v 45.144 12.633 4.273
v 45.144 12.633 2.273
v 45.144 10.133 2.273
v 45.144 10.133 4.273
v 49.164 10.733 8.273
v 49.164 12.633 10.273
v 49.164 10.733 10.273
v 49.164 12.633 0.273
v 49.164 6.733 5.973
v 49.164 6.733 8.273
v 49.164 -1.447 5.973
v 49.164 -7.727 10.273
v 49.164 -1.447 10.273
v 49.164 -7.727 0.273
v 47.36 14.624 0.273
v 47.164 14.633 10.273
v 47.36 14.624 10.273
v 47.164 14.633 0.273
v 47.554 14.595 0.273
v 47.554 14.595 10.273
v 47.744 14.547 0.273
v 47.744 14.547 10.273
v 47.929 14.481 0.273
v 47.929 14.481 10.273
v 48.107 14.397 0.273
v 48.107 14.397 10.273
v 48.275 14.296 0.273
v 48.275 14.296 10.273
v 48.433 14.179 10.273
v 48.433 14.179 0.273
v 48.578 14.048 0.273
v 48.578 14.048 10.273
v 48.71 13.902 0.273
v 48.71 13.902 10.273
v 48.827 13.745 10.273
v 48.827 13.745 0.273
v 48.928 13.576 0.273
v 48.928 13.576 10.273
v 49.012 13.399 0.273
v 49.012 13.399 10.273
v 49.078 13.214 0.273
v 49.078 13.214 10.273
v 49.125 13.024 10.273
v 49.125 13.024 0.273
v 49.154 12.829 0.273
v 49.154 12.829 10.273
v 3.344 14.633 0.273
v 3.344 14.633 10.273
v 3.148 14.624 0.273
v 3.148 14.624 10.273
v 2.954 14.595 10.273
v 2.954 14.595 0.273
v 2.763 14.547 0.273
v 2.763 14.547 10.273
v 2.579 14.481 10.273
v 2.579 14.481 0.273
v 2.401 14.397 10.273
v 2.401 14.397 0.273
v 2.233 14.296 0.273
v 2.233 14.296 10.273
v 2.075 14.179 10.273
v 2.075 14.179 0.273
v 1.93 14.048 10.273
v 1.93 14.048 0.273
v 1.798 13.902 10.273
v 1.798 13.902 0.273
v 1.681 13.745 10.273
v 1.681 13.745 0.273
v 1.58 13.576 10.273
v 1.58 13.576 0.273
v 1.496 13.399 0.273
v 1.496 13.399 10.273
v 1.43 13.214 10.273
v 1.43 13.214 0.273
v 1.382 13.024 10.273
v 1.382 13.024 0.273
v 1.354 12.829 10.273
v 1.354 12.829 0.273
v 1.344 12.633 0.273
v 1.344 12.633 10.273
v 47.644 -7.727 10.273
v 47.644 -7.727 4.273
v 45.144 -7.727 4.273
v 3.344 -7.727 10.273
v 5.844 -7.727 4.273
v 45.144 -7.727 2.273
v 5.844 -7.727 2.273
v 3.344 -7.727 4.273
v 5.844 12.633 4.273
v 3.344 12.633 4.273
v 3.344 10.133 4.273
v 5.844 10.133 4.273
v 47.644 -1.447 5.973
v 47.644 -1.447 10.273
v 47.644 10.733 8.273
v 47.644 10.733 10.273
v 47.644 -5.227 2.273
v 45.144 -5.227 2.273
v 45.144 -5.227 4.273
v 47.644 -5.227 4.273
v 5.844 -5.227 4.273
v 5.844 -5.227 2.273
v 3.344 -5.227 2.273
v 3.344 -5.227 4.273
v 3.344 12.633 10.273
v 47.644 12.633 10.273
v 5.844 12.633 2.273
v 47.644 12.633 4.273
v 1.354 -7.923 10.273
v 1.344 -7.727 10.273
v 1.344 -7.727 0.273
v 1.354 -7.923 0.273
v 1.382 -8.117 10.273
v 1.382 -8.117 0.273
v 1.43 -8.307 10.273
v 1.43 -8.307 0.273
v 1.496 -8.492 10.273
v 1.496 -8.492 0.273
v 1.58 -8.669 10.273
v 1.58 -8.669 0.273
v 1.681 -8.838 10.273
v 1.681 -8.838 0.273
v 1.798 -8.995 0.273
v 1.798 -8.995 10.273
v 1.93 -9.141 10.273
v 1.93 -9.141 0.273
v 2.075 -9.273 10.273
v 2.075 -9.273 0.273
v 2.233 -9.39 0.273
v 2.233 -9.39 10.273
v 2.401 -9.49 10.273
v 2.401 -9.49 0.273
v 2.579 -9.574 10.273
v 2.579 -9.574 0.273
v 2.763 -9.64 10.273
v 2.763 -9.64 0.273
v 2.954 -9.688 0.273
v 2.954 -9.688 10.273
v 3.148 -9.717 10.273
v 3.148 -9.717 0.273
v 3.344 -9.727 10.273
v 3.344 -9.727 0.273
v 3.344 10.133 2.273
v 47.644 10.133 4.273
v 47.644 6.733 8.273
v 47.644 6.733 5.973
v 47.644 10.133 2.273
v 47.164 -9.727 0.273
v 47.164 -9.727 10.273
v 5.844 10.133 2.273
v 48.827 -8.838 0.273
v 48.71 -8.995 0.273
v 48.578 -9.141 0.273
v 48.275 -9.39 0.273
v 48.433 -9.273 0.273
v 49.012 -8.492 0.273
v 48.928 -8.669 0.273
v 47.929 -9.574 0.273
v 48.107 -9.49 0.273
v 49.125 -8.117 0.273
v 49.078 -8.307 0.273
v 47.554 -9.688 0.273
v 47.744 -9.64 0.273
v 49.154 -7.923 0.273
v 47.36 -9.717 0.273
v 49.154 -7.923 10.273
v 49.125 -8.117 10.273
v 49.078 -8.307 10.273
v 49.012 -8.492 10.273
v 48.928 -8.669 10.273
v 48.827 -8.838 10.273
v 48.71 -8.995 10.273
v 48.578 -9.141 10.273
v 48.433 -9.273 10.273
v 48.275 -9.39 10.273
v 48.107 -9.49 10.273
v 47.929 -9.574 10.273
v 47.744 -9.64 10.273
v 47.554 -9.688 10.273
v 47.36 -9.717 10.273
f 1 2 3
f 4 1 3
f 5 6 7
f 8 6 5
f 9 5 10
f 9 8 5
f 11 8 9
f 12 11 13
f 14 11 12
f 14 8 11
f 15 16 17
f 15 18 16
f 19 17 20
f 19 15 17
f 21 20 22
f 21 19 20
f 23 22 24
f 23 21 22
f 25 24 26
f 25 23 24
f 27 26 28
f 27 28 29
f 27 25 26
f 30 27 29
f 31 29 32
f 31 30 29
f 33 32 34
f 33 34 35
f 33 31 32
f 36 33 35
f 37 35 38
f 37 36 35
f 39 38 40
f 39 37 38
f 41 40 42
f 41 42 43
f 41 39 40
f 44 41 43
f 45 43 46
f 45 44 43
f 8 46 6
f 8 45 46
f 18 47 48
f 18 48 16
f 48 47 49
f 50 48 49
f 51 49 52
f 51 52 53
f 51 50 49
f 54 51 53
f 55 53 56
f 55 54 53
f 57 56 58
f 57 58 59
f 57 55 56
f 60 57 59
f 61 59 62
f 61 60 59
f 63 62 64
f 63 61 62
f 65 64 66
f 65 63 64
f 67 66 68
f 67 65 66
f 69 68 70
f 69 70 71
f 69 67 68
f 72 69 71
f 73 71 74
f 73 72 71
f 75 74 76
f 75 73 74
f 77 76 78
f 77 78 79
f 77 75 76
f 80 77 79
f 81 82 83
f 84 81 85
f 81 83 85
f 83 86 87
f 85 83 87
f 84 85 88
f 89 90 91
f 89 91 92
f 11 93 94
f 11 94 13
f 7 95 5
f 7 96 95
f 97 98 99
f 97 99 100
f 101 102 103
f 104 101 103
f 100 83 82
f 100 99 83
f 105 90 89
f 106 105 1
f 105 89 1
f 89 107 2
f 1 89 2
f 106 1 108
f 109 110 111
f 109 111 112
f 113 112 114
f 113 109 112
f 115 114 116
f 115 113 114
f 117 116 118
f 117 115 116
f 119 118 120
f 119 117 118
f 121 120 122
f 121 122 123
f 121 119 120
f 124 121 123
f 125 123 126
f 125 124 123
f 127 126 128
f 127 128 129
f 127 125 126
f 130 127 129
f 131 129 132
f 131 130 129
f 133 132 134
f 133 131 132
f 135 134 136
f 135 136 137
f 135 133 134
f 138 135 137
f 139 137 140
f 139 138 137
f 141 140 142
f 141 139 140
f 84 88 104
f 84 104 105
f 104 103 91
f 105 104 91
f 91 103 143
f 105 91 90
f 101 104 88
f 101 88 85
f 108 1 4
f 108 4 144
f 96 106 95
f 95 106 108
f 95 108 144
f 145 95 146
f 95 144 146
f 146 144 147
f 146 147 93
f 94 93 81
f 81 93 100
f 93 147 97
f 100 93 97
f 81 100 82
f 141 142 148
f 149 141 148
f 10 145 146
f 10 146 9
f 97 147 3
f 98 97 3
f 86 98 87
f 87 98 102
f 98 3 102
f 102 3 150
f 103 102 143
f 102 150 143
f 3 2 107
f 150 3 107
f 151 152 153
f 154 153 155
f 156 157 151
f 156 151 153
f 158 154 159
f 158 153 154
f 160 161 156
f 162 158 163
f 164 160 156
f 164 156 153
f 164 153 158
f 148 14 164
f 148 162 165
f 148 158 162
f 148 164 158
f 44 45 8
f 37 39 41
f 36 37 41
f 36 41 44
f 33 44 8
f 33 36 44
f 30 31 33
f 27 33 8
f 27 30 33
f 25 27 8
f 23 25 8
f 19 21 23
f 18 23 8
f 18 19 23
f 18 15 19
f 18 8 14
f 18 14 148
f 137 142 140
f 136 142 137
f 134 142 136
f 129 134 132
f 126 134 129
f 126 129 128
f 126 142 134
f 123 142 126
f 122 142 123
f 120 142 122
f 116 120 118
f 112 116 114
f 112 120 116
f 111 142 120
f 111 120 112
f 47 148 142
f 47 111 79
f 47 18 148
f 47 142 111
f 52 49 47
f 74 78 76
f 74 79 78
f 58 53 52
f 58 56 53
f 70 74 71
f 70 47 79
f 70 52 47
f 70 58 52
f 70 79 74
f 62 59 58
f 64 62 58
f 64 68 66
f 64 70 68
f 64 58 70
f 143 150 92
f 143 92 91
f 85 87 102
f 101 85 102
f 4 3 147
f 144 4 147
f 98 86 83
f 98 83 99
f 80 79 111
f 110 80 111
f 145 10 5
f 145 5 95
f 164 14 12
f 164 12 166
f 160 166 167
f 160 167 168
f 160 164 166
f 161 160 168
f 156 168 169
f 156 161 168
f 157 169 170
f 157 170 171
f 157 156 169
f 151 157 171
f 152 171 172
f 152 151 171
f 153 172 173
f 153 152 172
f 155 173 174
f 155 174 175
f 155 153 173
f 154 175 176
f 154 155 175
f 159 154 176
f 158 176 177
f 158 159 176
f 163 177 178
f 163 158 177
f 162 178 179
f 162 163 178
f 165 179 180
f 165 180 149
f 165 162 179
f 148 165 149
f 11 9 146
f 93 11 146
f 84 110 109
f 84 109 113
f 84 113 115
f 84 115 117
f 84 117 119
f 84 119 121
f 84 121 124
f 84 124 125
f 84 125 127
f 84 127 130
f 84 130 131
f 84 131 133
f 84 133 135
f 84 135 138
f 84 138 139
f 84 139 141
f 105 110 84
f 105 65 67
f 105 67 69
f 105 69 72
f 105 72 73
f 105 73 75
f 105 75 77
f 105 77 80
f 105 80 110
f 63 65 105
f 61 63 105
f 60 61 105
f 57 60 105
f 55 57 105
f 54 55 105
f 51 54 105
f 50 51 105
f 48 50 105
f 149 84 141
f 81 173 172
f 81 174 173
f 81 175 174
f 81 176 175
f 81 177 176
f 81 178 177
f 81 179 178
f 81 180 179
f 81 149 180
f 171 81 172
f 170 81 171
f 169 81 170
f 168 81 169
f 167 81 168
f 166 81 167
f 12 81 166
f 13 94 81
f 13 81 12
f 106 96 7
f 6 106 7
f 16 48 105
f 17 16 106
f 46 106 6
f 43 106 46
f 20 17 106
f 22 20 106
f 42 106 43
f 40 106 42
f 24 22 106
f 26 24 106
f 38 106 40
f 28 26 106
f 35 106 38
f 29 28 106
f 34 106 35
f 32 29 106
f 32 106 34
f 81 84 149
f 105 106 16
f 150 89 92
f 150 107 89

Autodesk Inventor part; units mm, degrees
ref_plane "YZ Plane" through (0, 0, 0) normal (1, 0, 0) x (0, 1, 0)
ref_plane "XZ Plane" through (0, 0, 0) normal (0, 1, 0) x (-1, 0, 0)
ref_plane "Work Plane1" through (25.9939, 2.4534, 2.2732) normal (0, 0, -1) x (-1, 0, 0)
sketch "Sketch1" plane through (25.9939, 2.4534, 2.2732) normal (0, 0, -1) x (-1, 0, 0)
  line L0 (21.65, -9.18) -> (-21.65, -9.18) projected
  line L1 (21.65, 9.18) -> (21.65, -9.18) projected
  line L2 (-21.65, 9.18) -> (21.65, 9.18) projected
  line L3 (-21.65, -9.18) -> (-21.65, 9.18) projected
  line L4 (24.65, 12.18) -> (24.65, -12.18)
  line L5 (24.65, -12.18) -> (-23.17, -12.18)
  line L6 (-23.17, 12.18) -> (24.65, 12.18)
  line L7 (-23.17, 3.98) -> (-23.17, -3.6) projected
  line L8 (-23.17, 12.18) -> (-23.17, -12.18)
  point P0 (25.9939, -2.4534)
  dimension "d0" = 3
extrude "Extrusion1" add sketch "Sketch1" along normal blind 2 contours L0 L3 L2 L1 | L4 L5 L8 L7 L6
sketch "Sketch2" plane through (25.9939, 2.4534, 2.2732) normal (0, 0, 1) x (1, 0, 0)
  line L0 (-24.65, 12.18) -> (-24.65, -12.18) projected
  line L1 (-24.65, -12.18) -> (23.17, -12.18) projected
  line L2 (21.65, 9.18) -> (-21.65, 9.18) projected
  line L3 (-21.65, 9.18) -> (-21.65, -9.18) projected
  line L4 (-21.65, -9.18) -> (21.65, -9.18) projected
  line L5 (21.65, -10.18) -> (-22.65, -10.18)
  line L6 (-22.65, -10.18) -> (-22.65, 10.18)
  line L7 (-22.65, 10.18) -> (21.65, 10.18)
  line L8 (21.65, 10.18) -> (21.65, -10.18)
  line L9 (-24.65, 12.18) -> (23.17, 12.18)
  line L10 (23.17, 12.18) -> (23.17, -12.18)
  line L11 (23.17, -12.18) -> (-24.65, -12.18)
  line L12 (-24.65, -12.18) -> (-24.65, 12.18)
  point P0 (-25.9939, -2.4534)
  dimension "d3" = 1
extrude "Extrusion2" add sketch "Sketch2" along normal blind 8
sketch "Sketch4" plane through (25.9939, 2.4534, 10.2732) normal (0, 0, 1) x (1, 0, 0)
  line L0 (21.65, 10.18) -> (21.65, -10.18) projected
  line L1 (23.17, 3.98) -> (13.97, 3.98) construction
  line L2 (13.97, -3.6) -> (23.17, -3.6) construction
  line L3 (21.65, 3.98) -> (23.17, 3.98)
  line L4 (23.17, 3.98) -> (23.17, -3.6)
  line L5 (23.17, -3.6) -> (21.65, -3.6)
  line L6 (21.65, -3.6) -> (21.65, 3.98)
  point P0 (-25.9939, -2.4534)
ref_plane "Work Plane2" through (4.3439, -6.7266, 5.9732) normal (0, 0, 1) x (1, 0, 0)
extrude "Extrusion4" cut sketch "Sketch4" against normal up to surface (4.3 mm away)
sketch "Sketch5" plane through (47.6439, -1.1466, 10.2732) normal (0, 1, 0) x (1, 0, 0)
  line L0 (1.52, 4.3) -> (0, 4.3) projected
  line L1 (0, 0) -> (0, 4.3) projected
  line L2 (1.52, 0) -> (0, 0) projected
  line L3 (1.52, 4.3) -> (1.52, 0) projected
  point P0 (-47.6439, 10.2732)
extrude "Extrusion5" cut sketch "Sketch5" against normal blind 0.3
sketch "Sketch6" plane through (47.6439, 6.4334, 10.2732) normal (0, -1, 0) x (1, 0, 0)
  line L0 (0, -4.3) -> (1.52, -4.3) projected
  line L1 (1.52, 0) -> (1.52, -4.3) projected
  line L2 (0, 0) -> (1.52, 0) projected
  line L3 (0, -4.3) -> (0, 0) projected
  point P0 (-47.6439, -10.2732)
extrude "Extrusion6" cut sketch "Sketch6" against normal blind 0.3
sketch "Sketch7" plane through (47.6439, 6.7334, 10.2732) normal (0, -1, 0) x (1, 0, 0)
  line L0 (1.52, 0) -> (1.52, -4.3) projected
  line L1 (0, 0) -> (1.52, 0) projected
  line L2 (0, -4.3) -> (0, 0) projected
  line L3 (0, 0) -> (1.52, 0)
  line L4 (1.52, 0) -> (1.52, -2)
  line L5 (1.52, -2) -> (0, -2)
  line L6 (0, -2) -> (0, 0)
  point P0 (-47.6439, -10.2732)
  dimension "d14" = 2
  dimension "d15" = 0
extrude "Extrusion7" cut sketch "Sketch7" against normal blind 4
sketch "Sketch8" plane through (25.9939, 2.4534, 2.2732) normal (0, 0, 1) x (1, 0, 0)
  line L0 (-22.65, 10.18) -> (-20.15, 10.18)
  line L1 (-20.15, 10.18) -> (-20.15, 7.68)
  line L2 (-20.15, 7.68) -> (-22.65, 7.68)
  line L3 (-22.65, 7.68) -> (-22.65, 10.18)
  line L4 (21.65, 10.18) -> (19.15, 10.18)
  line L5 (19.15, 10.18) -> (19.15, 7.68)
  line L6 (19.15, 7.68) -> (21.65, 7.68)
  line L7 (21.65, 7.68) -> (21.65, 10.18)
  line L8 (-22.65, -10.18) -> (-20.15, -10.18)
  line L9 (-20.15, -10.18) -> (-20.15, -7.68)
  line L10 (-20.15, -7.68) -> (-22.65, -7.68)
  line L11 (-22.65, -7.68) -> (-22.65, -10.18)
  line L12 (21.65, -10.18) -> (19.15, -10.18)
  line L13 (19.15, -10.18) -> (19.15, -7.68)
  line L14 (19.15, -7.68) -> (21.65, -7.68)
  line L15 (21.65, -7.68) -> (21.65, -10.18)
  point P0 (-25.9939, -2.4534)
  dimension "d18" = 2.5
  dimension "d19" = 2.5
  dimension "d20" = 2.5
  dimension "d21" = 2.5
  dimension "d22" = 2.5
  dimension "d23" = 2.5
extrude "Extrusion8" add sketch "Sketch8" along normal blind 2
fillet "Fillet1" radius 2 4 edges at (49.1639, 14.6334, 5.2732) (49.1639, -9.7266, 5.2732) (1.3439, 14.6334, 5.2732) (1.3439, -9.7266, 5.2732)
properties part number "NanoCaseBottom" material "ABS Plastic"
